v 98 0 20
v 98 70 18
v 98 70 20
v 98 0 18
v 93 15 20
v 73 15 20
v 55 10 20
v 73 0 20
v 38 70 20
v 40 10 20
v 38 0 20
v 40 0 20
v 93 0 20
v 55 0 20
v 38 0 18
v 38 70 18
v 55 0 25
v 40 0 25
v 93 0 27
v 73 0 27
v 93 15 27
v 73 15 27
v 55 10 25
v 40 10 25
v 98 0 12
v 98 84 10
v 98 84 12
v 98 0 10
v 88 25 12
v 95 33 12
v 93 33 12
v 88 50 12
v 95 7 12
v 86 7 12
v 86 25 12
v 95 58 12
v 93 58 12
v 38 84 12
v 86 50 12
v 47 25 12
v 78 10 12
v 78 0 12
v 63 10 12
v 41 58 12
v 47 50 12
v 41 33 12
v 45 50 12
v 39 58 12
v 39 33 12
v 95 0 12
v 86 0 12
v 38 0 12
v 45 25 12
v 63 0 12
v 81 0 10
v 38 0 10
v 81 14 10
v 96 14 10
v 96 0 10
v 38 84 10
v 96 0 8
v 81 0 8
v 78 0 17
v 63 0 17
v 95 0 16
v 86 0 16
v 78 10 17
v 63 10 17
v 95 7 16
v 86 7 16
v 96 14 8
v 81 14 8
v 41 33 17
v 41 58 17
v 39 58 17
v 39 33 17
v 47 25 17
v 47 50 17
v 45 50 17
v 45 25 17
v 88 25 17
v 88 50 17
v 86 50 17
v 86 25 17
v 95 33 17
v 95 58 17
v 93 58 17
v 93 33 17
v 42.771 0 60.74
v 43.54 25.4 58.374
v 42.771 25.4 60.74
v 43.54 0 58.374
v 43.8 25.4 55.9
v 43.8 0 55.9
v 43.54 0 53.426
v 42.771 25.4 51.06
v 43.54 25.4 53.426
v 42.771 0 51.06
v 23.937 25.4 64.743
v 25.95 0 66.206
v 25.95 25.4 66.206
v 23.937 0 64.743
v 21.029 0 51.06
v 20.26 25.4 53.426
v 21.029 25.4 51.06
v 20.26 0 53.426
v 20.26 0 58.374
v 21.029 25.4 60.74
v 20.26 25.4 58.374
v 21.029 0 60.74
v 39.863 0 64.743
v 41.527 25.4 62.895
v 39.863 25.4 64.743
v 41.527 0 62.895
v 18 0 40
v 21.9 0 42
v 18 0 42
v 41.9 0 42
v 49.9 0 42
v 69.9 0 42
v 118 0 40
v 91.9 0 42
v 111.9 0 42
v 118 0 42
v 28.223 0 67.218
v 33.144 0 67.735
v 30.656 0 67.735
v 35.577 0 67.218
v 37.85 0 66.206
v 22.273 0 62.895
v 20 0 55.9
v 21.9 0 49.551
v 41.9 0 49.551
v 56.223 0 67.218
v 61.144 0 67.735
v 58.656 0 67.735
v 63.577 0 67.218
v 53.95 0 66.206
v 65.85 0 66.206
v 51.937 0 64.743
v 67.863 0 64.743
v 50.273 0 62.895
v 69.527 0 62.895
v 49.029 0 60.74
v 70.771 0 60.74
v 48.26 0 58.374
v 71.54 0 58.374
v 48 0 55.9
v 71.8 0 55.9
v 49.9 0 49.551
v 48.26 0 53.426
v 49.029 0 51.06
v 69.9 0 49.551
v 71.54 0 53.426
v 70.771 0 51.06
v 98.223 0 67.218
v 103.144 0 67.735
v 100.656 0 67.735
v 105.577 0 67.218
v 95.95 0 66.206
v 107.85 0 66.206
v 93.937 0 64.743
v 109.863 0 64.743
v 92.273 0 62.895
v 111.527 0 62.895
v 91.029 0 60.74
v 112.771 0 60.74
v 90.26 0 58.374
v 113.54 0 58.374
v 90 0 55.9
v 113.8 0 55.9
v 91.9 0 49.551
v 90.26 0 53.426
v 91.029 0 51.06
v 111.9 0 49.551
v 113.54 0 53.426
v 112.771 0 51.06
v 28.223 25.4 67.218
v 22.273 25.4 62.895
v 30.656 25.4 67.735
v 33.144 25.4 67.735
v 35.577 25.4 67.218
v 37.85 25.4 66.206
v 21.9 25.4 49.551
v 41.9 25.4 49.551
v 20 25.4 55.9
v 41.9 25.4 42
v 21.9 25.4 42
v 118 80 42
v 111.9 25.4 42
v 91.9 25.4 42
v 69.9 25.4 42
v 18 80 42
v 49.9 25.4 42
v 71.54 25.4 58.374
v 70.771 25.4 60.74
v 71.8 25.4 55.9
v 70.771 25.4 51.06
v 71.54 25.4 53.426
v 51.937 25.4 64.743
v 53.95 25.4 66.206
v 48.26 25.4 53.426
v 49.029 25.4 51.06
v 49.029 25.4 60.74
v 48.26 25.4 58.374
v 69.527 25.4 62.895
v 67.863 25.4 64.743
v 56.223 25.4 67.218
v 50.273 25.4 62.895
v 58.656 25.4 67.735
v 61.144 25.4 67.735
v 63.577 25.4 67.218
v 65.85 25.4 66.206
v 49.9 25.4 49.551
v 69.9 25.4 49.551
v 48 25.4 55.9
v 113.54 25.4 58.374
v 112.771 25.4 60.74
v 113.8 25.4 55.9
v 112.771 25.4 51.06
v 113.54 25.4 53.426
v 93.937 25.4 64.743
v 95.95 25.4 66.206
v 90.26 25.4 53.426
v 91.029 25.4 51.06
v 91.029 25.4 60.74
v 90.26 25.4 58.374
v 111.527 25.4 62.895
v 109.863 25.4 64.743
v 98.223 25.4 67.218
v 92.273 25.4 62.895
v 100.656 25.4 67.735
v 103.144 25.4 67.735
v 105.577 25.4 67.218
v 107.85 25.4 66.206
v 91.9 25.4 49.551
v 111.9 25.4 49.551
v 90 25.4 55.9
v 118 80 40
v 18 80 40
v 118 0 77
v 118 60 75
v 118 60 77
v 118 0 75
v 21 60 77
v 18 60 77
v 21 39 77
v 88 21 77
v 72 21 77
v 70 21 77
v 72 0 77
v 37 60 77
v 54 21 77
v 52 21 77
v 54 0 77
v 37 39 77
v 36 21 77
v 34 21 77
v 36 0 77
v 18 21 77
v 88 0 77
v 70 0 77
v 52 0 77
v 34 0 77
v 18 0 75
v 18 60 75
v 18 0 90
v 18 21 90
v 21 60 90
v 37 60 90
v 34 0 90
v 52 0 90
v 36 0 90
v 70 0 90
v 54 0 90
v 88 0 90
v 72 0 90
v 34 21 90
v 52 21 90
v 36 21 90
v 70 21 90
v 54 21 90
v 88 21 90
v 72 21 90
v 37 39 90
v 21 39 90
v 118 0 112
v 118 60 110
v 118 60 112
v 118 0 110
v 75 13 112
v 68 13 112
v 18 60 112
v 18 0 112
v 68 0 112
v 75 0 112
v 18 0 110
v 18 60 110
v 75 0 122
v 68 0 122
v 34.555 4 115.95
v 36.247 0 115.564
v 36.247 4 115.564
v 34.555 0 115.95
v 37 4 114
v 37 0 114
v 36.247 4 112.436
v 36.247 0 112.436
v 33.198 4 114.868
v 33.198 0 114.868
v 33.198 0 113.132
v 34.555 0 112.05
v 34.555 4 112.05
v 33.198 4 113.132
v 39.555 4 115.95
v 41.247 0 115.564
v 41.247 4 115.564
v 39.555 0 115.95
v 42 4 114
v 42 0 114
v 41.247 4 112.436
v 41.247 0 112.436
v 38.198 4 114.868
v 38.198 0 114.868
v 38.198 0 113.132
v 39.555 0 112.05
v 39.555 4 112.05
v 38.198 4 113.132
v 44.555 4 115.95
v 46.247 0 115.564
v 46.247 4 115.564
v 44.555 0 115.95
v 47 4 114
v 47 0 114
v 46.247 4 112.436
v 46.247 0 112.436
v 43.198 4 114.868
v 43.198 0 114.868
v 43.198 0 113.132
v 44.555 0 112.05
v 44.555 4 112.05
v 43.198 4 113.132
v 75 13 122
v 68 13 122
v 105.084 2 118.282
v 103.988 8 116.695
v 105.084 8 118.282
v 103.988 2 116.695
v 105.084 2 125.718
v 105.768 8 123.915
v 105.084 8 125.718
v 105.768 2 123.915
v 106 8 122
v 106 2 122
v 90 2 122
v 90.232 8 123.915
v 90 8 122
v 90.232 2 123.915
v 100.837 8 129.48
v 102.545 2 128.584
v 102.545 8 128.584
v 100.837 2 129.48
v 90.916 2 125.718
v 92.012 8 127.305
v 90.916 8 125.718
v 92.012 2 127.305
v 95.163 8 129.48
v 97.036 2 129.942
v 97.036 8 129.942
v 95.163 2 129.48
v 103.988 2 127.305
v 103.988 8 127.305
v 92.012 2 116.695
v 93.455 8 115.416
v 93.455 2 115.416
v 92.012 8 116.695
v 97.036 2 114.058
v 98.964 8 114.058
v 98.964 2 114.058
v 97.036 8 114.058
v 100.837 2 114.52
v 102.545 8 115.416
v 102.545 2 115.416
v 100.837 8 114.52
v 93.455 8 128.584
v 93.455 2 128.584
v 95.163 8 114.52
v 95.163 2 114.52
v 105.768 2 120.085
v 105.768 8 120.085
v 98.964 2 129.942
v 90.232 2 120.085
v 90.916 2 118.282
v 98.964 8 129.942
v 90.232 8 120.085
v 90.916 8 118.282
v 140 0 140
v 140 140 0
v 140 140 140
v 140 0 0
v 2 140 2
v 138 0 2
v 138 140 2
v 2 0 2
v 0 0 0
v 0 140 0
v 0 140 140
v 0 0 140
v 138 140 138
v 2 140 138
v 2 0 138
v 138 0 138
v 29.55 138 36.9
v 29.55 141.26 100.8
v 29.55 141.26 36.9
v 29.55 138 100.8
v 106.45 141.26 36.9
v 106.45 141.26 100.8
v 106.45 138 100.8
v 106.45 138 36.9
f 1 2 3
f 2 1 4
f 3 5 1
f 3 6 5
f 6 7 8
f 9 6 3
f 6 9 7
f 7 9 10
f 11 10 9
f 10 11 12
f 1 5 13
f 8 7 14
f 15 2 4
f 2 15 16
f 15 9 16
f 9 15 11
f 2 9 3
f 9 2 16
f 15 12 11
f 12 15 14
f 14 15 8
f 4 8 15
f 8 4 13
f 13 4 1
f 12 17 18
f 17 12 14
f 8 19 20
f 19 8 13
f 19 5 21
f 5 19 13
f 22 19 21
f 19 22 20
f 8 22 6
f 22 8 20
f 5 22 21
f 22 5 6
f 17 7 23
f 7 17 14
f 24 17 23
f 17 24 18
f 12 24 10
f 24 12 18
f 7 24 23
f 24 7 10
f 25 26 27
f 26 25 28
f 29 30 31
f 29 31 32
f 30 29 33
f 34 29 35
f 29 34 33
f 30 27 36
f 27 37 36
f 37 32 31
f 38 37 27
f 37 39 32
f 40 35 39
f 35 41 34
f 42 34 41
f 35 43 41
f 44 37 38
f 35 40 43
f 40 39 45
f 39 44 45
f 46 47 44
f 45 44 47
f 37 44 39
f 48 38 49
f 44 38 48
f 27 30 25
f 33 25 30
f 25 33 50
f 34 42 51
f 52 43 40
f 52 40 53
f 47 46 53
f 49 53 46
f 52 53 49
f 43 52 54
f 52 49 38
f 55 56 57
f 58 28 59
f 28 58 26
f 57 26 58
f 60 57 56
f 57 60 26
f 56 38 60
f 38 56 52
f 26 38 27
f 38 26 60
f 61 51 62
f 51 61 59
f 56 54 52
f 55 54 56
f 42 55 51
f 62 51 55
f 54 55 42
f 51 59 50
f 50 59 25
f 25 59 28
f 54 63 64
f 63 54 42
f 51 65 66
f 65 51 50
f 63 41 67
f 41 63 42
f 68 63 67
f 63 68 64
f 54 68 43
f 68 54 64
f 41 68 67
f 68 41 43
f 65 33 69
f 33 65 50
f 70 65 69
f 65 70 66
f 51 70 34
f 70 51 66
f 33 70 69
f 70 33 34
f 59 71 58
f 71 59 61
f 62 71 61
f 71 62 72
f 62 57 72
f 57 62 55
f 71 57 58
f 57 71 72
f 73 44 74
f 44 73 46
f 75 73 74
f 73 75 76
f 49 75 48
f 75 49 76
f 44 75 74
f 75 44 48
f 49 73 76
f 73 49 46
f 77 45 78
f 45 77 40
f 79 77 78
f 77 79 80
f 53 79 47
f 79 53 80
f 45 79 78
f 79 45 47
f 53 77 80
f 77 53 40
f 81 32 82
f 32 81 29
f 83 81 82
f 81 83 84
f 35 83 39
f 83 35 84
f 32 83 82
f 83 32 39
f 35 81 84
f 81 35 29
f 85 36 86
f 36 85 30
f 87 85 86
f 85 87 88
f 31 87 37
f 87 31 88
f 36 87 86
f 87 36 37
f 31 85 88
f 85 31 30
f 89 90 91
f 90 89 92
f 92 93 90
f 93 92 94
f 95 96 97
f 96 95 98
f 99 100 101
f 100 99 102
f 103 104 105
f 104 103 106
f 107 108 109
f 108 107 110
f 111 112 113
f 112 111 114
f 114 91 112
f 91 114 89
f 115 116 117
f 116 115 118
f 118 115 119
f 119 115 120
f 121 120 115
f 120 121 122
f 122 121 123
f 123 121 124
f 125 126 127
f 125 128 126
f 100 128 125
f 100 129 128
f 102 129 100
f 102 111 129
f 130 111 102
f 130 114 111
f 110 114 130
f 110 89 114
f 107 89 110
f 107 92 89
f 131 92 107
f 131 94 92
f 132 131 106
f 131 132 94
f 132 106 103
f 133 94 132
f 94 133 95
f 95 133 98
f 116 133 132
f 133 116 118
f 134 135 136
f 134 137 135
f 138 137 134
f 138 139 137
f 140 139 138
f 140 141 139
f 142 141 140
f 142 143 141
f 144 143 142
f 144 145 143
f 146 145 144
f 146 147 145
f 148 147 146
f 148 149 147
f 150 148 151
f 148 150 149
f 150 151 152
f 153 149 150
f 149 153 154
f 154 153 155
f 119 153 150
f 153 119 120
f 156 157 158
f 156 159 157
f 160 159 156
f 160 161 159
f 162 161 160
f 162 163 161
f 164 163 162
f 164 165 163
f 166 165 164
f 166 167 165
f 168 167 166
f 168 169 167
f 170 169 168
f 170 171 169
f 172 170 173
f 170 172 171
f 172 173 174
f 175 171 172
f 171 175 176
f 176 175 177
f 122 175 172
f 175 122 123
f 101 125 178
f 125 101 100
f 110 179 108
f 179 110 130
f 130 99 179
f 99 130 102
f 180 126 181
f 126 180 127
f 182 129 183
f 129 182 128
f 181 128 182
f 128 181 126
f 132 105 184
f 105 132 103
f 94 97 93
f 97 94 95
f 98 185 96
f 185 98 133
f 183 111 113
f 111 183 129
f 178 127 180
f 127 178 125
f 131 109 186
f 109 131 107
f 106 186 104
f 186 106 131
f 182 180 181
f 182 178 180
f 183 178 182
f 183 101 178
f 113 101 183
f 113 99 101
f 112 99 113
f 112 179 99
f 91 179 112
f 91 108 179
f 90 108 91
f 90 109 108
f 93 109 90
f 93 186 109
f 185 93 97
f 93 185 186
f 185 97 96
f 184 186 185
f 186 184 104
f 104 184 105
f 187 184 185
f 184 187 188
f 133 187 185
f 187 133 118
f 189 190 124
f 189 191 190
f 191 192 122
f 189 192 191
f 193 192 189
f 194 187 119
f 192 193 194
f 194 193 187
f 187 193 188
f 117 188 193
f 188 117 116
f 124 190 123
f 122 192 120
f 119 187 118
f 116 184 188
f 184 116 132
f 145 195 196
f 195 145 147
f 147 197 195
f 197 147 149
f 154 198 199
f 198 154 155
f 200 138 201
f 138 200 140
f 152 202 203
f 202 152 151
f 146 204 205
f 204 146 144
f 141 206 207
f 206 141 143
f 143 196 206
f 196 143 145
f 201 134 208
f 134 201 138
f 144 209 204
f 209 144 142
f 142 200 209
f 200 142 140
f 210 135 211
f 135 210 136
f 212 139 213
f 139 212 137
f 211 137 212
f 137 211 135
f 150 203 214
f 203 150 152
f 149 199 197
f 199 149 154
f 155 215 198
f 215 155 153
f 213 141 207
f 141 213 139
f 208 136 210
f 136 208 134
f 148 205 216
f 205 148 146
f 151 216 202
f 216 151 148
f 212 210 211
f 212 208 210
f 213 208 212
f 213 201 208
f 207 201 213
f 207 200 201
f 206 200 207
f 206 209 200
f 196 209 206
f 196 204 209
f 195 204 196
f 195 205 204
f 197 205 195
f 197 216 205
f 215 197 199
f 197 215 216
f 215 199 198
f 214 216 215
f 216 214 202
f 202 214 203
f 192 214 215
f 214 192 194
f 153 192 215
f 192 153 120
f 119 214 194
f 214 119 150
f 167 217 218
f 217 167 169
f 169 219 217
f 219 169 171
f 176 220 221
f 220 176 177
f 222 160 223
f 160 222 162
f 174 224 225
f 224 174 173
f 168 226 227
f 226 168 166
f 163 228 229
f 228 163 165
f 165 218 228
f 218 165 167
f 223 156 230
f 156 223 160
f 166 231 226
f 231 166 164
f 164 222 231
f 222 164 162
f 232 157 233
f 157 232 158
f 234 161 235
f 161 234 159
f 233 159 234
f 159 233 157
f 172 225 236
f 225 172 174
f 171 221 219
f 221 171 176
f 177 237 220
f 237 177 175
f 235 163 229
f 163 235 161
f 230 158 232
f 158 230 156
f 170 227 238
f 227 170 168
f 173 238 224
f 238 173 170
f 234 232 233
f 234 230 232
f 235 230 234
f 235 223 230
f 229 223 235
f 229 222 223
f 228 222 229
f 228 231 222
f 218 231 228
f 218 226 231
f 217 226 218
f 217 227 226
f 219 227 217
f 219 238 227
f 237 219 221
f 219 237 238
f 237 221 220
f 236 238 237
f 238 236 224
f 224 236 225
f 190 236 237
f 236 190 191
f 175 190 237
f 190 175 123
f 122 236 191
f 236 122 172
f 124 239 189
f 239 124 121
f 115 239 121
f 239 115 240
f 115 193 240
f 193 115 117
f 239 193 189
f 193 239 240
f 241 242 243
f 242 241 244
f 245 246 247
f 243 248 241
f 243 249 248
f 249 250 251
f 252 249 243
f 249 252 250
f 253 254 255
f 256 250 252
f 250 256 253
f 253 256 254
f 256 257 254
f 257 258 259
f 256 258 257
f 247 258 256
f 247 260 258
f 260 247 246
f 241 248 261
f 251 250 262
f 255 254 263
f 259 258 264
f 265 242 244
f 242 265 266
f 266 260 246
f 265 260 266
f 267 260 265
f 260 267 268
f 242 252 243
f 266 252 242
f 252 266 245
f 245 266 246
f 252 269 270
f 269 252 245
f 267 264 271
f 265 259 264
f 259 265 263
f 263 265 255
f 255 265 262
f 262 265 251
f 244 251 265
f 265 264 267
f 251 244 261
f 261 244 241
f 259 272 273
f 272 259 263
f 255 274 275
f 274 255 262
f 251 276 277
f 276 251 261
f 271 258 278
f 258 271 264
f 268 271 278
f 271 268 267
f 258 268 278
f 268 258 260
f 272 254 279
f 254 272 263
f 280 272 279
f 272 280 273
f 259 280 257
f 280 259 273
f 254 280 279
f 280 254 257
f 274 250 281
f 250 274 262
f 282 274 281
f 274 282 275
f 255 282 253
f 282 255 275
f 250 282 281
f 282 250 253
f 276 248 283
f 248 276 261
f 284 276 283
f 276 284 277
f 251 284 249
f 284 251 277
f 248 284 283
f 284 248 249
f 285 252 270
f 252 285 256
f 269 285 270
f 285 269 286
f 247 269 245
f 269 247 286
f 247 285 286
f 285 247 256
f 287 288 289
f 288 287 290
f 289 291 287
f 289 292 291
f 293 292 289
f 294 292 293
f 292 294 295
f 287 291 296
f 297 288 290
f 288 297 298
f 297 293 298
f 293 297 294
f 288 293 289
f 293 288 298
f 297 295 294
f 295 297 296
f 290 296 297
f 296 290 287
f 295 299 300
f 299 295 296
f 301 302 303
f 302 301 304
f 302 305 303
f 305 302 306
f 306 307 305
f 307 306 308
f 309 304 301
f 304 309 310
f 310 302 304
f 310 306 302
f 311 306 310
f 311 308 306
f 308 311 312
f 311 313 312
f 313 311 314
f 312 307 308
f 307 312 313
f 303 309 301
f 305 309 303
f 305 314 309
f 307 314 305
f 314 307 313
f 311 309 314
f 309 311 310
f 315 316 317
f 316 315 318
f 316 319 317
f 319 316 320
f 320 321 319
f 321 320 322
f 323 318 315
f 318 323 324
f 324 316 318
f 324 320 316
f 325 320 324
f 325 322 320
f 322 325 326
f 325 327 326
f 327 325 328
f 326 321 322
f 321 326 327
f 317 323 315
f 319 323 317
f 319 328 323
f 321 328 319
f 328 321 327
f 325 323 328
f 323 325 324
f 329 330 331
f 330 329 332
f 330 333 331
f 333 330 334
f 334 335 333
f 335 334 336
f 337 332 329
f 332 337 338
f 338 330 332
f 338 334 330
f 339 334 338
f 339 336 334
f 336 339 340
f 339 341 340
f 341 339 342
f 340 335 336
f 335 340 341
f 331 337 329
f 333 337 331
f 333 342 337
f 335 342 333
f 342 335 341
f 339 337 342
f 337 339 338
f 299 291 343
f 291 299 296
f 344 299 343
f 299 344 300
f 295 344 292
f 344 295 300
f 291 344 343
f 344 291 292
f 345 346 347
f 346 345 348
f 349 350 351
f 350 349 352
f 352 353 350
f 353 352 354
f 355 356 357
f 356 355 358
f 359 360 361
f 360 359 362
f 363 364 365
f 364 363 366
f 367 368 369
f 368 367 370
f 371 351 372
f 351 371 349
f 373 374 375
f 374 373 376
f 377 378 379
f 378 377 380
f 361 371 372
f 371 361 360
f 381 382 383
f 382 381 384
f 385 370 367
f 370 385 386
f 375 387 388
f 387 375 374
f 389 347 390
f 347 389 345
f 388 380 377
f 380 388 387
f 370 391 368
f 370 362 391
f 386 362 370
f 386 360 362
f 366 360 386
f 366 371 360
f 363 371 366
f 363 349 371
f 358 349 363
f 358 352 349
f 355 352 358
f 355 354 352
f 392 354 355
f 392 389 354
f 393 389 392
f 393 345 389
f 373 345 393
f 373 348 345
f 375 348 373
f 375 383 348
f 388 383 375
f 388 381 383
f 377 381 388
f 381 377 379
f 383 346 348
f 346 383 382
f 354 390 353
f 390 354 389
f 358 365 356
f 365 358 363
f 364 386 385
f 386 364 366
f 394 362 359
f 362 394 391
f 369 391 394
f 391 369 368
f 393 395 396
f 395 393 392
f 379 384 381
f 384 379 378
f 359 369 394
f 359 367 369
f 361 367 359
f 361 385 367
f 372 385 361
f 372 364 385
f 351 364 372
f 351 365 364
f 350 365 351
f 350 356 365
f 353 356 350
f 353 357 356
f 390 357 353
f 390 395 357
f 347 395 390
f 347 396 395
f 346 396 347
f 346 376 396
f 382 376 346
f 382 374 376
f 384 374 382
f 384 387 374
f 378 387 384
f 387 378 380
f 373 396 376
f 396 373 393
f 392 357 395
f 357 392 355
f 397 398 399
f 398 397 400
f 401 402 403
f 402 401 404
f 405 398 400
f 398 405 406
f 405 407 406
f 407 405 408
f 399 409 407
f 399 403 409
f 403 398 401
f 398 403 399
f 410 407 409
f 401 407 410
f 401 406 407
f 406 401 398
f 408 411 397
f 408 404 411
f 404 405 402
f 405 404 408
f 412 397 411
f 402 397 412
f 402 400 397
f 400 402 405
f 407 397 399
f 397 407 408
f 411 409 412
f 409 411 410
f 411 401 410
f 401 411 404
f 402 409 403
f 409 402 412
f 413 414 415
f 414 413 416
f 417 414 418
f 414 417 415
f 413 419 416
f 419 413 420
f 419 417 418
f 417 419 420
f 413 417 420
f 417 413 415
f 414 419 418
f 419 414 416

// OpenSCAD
module side(w=140, h=140) {
    cube([h,w,2]);
}

module case() {
    color("red", 0.25) union() {
        side(); // bottom
        translate([0,0,138]) { side(); } //top

        translate([2,0,2]) { rotate(-90, [0,140,0]) { side(h=136); } }
        translate([140,0,2]) { rotate(-90, [0,140,0]) { side(h=136); } }
    }
}

module lcd(){
    color("blue")
        cube([76.9, 63.9, 3.26]); //non-touch

}

module limeshield() {
    module connector_hdmi() {
        color("green") cube([15,10,5]);
    }

    module connector_mini_usb() {
        color("green") cube([9,7,4]);
    }

    module connector_usb() {
        color("green") cube([20,15,7]);
    }

    module sdcard() {
        color("green") cube([15,14,2]);
    }

    module header() {
        color("black") cube([2,25,5]);
    }

    cube([60,84,2]);
    translate([25,0,2]) connector_hdmi();
    translate([48,0,2]) connector_mini_usb();
    translate([43,0,-2]) sdcard();

    translate([1,33,2]) header();
    translate([7,25,2]) header();
    translate([48,25,2]) header();
    translate([55,33,2]) header();

    translate([0,0,8]) {
        cube([60,70,2]);
        translate([35,0,2]) connector_usb();
        translate([2,0,2]) connector_hdmi();
    }
}

module audio() {
    module xlr() {
        color("pink") {
            diameter = 23.8;
            depth = 25.4;
            support = 20;
            offset = 2;

            translate([(support/2)+((diameter-support)/2),depth/2,(diameter/2)+offset]) rotate([90,0,0])
                cylinder(h=depth, r=diameter/2, center=true);
            translate([((diameter-support)/2),0,0]) cube([support,depth,support]);
        }
    }
    
    cube([100,80,2]);
    translate([2,0,2]) xlr();
    translate([30,0,2]) xlr();
    translate([72,0,2]) xlr();
}

module switch() {
    module port() {
        color("orange") cube([16,21,13]);
    }
    
    cube([100,60,2]);

    translate([0,0,2]) port();
    translate([18,0,2]) port();
    translate([36,0,2]) port();
    translate([54,0,2]) port();

    translate([3,39,2]) port();
}

module power() {
    module led() {
        color("green") translate([2,2,2]) rotate([90,0,0]) cylinder(h=4, r=2, center=true);
    }

    module powerbutton() {
        color("green") translate([10,5,10]) rotate([90,0,0]) cylinder(h=6, r=8, center=true);
    }

    module dcin() {
        color("black") cube([7,13,10]);
    }

    cube([100,60,2]);

    translate([15,0,2]) led();
    translate([20,0,2]) led();
    translate([25,0,2]) led();

    translate([50,0,2]) dcin();

    translate([70,0,2]) powerbutton();
}

translate([38,0,10]) limeshield();

translate([18,0,40]) audio();

translate([18,0,75]) switch();

translate([18,0,110]) power();

translate([76.9+29.55, 138, 63.9-27]) rotate([270,180,0]) lcd();

case();
